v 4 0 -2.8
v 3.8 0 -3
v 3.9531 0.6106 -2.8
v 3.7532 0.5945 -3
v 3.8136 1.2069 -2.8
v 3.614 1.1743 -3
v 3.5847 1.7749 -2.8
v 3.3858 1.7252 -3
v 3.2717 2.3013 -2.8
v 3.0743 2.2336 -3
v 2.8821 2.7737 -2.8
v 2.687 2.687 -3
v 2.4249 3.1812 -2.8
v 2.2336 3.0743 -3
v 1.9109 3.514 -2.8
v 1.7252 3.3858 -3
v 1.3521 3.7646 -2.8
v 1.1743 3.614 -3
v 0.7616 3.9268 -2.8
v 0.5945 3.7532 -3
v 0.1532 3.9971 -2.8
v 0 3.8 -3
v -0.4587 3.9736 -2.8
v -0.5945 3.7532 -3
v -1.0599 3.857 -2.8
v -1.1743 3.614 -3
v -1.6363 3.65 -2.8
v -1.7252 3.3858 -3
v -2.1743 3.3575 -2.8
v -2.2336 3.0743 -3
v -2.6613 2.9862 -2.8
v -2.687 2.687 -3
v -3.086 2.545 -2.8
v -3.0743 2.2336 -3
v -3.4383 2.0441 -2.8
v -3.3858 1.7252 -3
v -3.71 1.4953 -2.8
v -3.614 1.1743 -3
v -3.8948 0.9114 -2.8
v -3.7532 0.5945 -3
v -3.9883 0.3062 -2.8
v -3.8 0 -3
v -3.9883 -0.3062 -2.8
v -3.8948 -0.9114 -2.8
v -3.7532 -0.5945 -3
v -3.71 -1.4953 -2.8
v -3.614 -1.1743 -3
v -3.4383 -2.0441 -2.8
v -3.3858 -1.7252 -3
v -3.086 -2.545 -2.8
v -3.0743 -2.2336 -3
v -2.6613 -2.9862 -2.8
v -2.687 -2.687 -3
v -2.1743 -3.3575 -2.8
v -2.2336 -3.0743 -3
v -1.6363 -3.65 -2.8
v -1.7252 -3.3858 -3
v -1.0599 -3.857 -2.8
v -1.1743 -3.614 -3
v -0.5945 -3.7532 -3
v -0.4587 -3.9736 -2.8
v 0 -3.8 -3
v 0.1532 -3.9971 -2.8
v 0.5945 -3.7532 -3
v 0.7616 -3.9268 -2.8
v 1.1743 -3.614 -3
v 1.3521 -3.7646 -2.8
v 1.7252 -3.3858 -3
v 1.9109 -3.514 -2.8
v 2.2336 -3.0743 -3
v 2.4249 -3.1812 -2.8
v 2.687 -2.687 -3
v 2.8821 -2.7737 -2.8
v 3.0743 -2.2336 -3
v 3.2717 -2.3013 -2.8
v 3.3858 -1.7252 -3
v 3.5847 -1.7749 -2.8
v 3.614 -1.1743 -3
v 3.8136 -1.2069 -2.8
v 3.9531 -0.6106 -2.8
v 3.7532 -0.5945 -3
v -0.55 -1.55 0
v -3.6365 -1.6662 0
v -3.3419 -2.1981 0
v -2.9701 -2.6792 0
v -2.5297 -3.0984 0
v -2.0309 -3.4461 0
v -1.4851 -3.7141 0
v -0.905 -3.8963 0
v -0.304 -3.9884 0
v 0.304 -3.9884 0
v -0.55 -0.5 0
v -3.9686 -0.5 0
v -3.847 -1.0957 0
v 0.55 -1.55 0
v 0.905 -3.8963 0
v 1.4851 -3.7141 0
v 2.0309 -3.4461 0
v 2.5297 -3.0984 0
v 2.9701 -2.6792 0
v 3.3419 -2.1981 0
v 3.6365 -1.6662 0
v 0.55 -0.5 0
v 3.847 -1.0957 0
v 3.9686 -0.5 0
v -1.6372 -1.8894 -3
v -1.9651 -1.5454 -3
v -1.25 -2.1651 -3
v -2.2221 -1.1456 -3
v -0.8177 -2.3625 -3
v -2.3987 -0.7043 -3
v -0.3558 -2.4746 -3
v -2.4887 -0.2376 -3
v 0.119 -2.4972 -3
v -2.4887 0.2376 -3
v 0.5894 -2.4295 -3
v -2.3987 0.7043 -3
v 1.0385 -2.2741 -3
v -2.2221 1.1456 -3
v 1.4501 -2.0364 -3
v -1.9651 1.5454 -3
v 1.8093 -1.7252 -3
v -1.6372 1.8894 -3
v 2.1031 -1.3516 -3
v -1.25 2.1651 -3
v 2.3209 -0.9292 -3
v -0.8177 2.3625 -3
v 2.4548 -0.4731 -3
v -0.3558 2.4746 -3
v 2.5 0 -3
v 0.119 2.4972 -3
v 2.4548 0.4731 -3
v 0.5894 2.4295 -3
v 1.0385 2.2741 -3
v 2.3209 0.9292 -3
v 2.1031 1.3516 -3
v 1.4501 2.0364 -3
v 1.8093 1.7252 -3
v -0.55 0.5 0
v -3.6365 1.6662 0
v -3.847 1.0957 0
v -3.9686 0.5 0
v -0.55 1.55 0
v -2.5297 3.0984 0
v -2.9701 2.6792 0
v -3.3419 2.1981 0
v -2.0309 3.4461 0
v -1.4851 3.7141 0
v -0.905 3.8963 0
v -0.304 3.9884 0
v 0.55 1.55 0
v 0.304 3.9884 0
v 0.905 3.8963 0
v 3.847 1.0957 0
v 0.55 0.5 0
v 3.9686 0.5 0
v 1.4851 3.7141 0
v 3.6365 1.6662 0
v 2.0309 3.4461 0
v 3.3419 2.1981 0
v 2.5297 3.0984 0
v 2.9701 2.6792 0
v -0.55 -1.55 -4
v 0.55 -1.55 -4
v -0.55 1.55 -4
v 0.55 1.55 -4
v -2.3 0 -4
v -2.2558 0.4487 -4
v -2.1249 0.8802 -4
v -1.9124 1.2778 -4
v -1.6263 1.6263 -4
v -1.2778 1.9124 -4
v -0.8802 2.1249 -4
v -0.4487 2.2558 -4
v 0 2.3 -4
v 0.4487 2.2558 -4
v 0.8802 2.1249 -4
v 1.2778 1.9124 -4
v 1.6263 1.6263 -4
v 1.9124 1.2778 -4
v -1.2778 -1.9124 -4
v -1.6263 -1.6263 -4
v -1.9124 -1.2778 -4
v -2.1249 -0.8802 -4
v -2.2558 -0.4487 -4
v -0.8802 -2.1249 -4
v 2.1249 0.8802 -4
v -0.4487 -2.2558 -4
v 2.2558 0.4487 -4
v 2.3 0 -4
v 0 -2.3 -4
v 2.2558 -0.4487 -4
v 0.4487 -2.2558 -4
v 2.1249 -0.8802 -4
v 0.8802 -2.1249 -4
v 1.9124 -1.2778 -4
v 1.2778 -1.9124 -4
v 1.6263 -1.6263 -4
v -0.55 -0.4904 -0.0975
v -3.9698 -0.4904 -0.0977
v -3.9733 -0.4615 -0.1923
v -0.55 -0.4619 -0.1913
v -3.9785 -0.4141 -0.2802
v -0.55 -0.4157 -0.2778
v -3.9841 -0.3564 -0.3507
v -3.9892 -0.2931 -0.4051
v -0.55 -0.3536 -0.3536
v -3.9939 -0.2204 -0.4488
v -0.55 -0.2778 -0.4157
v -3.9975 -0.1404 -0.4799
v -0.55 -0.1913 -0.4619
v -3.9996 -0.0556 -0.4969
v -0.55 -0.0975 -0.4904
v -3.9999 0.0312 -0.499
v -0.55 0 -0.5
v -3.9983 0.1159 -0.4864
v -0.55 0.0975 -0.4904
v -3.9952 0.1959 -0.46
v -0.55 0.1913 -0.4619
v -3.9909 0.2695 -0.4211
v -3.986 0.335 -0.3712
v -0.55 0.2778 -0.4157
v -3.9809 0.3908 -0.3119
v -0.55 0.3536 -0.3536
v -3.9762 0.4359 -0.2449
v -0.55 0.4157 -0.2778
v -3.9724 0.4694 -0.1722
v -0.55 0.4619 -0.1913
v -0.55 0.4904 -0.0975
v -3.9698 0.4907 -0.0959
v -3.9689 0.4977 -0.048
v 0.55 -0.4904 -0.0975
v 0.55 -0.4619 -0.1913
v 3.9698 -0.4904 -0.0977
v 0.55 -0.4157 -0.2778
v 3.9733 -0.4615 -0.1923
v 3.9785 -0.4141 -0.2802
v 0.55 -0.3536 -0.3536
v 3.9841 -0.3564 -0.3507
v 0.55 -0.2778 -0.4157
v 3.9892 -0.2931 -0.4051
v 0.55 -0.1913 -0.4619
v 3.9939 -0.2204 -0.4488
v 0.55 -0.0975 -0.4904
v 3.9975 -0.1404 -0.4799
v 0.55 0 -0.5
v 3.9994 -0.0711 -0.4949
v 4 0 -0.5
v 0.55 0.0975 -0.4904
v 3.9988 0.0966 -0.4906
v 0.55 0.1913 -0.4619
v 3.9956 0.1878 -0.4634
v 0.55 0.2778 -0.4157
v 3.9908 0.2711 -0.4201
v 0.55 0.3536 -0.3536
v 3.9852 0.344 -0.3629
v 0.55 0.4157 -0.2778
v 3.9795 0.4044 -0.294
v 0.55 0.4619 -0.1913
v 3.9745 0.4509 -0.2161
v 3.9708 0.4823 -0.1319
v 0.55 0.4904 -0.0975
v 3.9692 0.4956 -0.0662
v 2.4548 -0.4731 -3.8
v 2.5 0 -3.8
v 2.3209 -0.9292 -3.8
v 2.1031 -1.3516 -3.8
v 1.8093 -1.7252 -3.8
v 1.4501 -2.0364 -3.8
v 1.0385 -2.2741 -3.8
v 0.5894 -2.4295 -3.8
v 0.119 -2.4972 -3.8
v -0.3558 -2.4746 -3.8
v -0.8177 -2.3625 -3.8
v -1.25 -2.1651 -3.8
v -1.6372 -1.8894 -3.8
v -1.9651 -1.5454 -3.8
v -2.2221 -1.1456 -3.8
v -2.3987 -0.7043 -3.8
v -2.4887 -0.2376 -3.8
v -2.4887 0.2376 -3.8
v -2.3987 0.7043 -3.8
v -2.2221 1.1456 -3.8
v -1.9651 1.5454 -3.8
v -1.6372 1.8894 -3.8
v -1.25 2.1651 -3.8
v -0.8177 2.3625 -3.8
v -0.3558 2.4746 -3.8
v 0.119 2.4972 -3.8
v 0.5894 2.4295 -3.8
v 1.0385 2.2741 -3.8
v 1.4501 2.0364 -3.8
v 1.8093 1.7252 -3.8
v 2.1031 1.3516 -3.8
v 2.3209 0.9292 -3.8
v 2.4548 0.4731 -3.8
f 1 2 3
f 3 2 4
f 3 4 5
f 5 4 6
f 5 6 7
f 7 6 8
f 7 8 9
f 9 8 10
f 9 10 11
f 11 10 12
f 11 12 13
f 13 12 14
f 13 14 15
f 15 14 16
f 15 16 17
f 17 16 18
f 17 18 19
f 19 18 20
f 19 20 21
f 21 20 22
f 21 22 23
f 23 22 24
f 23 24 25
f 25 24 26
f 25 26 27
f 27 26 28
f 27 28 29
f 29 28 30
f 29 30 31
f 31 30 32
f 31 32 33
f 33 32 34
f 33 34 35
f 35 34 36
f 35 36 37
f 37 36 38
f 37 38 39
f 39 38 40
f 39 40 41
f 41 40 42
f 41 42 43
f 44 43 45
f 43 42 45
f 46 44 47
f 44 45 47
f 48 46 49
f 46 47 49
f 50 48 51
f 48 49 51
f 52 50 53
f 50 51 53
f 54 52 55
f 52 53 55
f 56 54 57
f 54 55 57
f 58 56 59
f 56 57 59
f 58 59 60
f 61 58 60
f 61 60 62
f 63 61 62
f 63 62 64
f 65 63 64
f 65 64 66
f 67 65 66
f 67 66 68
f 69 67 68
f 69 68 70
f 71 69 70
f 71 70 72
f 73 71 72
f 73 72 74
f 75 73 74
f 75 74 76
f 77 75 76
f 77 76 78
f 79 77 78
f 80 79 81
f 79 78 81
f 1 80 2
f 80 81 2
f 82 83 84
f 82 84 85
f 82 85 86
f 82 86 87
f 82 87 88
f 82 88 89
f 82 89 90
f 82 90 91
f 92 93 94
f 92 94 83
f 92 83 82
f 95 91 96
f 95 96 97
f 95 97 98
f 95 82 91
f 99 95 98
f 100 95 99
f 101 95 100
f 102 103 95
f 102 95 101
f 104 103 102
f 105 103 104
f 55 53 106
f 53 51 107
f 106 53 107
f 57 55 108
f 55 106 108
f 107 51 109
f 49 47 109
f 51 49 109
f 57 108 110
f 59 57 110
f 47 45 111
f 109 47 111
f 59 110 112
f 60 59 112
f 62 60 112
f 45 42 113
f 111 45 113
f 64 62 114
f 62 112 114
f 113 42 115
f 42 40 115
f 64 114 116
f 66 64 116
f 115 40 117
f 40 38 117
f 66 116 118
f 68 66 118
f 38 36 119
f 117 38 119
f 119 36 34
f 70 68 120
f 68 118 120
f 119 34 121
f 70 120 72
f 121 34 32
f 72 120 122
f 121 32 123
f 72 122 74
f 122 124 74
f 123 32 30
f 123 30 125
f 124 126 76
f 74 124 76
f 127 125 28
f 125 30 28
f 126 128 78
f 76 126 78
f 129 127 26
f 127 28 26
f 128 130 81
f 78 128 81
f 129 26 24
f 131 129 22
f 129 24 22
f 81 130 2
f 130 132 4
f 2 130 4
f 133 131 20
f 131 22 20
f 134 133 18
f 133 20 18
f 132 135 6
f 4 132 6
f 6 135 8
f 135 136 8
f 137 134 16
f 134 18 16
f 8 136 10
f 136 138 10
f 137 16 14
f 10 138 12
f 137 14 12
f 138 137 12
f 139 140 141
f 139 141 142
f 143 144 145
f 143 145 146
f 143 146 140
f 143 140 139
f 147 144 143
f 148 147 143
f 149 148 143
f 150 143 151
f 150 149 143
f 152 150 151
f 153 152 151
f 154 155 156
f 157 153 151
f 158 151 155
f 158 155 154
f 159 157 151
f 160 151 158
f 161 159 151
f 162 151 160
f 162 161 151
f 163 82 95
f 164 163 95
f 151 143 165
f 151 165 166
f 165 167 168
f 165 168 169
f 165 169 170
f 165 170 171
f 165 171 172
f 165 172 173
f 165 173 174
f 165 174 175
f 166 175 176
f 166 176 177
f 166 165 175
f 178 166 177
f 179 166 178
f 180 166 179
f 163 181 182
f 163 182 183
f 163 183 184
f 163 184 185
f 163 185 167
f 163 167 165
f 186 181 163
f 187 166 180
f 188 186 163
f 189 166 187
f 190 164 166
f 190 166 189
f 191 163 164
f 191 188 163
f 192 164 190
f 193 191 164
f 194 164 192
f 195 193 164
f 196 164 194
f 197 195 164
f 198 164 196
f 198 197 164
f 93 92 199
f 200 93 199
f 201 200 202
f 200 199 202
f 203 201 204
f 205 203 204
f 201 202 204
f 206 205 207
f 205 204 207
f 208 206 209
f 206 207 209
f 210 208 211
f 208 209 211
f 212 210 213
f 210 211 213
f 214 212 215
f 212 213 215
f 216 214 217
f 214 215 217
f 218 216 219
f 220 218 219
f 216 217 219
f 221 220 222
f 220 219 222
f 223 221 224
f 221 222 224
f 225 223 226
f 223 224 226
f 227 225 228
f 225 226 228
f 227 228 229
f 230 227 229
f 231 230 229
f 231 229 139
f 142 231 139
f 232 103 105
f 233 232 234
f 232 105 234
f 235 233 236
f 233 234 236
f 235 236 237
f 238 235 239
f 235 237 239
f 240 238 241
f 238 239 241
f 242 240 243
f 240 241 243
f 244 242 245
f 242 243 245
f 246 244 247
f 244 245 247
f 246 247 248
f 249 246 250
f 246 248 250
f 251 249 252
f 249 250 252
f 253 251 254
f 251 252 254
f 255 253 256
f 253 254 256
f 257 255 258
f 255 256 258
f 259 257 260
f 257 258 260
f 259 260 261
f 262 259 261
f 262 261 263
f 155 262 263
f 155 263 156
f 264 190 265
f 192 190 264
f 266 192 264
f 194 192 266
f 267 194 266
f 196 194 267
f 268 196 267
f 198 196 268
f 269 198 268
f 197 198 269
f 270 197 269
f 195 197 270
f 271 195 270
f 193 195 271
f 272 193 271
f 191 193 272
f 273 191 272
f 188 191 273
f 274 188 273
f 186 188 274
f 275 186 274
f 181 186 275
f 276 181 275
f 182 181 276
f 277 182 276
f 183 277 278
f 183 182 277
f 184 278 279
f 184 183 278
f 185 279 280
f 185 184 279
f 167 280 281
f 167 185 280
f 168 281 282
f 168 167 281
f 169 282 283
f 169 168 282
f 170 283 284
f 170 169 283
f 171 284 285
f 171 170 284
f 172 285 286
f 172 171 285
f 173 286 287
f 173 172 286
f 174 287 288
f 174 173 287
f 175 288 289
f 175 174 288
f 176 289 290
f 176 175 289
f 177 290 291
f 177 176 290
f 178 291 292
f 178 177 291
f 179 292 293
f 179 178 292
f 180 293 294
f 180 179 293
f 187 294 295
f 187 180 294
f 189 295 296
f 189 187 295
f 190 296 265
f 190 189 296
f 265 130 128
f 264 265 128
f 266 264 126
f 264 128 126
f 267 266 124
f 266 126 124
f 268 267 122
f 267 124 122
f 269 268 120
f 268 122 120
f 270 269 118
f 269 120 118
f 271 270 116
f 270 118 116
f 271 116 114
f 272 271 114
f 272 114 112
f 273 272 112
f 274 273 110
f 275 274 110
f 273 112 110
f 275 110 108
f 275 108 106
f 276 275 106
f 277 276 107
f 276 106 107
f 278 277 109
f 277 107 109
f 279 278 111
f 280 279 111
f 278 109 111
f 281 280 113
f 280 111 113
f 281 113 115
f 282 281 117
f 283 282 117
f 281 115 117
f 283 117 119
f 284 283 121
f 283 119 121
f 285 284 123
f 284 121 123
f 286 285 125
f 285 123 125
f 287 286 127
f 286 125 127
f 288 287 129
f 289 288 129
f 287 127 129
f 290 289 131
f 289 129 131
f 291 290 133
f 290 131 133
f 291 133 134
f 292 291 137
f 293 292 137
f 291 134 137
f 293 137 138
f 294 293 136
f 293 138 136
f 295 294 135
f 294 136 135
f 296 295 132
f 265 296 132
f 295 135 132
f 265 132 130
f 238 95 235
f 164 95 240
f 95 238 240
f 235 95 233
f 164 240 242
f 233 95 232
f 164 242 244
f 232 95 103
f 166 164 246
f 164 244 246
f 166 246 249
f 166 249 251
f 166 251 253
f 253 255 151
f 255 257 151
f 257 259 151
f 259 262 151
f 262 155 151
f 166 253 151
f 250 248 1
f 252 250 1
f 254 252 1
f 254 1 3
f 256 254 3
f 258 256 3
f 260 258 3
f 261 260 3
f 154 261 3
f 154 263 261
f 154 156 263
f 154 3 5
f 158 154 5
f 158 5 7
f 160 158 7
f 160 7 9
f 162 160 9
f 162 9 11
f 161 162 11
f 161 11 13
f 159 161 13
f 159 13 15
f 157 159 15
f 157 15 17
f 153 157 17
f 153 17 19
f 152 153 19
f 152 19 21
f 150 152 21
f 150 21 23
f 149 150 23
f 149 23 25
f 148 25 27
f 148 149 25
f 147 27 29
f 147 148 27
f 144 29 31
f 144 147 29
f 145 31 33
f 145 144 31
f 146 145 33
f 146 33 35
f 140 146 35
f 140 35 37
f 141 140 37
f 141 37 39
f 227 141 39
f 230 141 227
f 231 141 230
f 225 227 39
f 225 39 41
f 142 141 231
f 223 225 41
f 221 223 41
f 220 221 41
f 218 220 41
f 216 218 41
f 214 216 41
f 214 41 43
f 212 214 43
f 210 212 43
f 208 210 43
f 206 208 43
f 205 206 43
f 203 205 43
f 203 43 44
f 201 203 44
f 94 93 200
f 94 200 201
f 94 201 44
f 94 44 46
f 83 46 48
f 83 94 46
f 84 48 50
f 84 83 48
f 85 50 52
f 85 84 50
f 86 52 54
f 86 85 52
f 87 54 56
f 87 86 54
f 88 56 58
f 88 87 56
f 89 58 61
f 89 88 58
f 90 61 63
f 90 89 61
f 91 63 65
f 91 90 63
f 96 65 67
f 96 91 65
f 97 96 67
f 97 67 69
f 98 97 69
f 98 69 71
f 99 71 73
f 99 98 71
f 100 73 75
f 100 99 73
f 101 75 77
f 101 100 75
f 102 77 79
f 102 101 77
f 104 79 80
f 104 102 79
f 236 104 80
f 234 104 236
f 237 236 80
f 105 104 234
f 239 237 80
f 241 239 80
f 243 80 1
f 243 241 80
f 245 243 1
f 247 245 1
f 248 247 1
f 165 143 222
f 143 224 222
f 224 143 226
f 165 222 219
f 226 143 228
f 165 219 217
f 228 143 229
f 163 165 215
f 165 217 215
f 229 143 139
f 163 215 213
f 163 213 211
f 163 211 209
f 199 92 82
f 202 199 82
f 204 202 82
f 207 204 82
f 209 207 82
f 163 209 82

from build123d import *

# Parameters (mm, degrees)
F0_R     = 4
F1_DEPTH = 3
F2_R     = 2.5
F3_DEPTH = 1
F4_R     = 0.5
F5_DEPTH = 9
F6_W     = 1.1
F6_H     = 1.05
F6_H_2   = 1
F7_DEPTH = 4.001
F8_SIZE  = 0.2


# Not quite as in the source:
# - a feature names something its author has since deleted; it is built from what else it names


with BuildPart() as f1:
    # F0 (on Top) → F1 (new body)
    with BuildSketch(Plane.XY):
        Circle(F0_R)
    extrude(amount=-F1_DEPTH)

    # F2 (on face) → F3 (join)
    with BuildSketch(Plane(origin=(0, 0, -3), x_dir=(1, 0, 0), z_dir=(0, 0, -1))):
        Circle(F2_R)
    extrude(amount=F3_DEPTH)

    # F4 (on Right) → F5 (cut, symmetric)
    with BuildSketch(Plane.YZ):
        Circle(F4_R)
    extrude(amount=F5_DEPTH, both=True, mode=Mode.SUBTRACT)

    # F6 (on face) → F7 (cut, through all)
    with BuildSketch(Plane.XY):
        with Locations((0, -1.025)):
            Rectangle(F6_W, F6_H)
        Rectangle(F6_W, F6_H_2)
        with Locations((0, 1.025)):
            Rectangle(F6_W, F6_H)
    extrude(amount=-F7_DEPTH, mode=Mode.SUBTRACT)

    # F8
    f8_edges = [f1.edges().sort_by_distance(p)[0] for p in [
        (-4, 0, -3),
        (-2.5, 0, -4),
    ]]
    chamfer(f8_edges, length=F8_SIZE)


solid = f1.part
